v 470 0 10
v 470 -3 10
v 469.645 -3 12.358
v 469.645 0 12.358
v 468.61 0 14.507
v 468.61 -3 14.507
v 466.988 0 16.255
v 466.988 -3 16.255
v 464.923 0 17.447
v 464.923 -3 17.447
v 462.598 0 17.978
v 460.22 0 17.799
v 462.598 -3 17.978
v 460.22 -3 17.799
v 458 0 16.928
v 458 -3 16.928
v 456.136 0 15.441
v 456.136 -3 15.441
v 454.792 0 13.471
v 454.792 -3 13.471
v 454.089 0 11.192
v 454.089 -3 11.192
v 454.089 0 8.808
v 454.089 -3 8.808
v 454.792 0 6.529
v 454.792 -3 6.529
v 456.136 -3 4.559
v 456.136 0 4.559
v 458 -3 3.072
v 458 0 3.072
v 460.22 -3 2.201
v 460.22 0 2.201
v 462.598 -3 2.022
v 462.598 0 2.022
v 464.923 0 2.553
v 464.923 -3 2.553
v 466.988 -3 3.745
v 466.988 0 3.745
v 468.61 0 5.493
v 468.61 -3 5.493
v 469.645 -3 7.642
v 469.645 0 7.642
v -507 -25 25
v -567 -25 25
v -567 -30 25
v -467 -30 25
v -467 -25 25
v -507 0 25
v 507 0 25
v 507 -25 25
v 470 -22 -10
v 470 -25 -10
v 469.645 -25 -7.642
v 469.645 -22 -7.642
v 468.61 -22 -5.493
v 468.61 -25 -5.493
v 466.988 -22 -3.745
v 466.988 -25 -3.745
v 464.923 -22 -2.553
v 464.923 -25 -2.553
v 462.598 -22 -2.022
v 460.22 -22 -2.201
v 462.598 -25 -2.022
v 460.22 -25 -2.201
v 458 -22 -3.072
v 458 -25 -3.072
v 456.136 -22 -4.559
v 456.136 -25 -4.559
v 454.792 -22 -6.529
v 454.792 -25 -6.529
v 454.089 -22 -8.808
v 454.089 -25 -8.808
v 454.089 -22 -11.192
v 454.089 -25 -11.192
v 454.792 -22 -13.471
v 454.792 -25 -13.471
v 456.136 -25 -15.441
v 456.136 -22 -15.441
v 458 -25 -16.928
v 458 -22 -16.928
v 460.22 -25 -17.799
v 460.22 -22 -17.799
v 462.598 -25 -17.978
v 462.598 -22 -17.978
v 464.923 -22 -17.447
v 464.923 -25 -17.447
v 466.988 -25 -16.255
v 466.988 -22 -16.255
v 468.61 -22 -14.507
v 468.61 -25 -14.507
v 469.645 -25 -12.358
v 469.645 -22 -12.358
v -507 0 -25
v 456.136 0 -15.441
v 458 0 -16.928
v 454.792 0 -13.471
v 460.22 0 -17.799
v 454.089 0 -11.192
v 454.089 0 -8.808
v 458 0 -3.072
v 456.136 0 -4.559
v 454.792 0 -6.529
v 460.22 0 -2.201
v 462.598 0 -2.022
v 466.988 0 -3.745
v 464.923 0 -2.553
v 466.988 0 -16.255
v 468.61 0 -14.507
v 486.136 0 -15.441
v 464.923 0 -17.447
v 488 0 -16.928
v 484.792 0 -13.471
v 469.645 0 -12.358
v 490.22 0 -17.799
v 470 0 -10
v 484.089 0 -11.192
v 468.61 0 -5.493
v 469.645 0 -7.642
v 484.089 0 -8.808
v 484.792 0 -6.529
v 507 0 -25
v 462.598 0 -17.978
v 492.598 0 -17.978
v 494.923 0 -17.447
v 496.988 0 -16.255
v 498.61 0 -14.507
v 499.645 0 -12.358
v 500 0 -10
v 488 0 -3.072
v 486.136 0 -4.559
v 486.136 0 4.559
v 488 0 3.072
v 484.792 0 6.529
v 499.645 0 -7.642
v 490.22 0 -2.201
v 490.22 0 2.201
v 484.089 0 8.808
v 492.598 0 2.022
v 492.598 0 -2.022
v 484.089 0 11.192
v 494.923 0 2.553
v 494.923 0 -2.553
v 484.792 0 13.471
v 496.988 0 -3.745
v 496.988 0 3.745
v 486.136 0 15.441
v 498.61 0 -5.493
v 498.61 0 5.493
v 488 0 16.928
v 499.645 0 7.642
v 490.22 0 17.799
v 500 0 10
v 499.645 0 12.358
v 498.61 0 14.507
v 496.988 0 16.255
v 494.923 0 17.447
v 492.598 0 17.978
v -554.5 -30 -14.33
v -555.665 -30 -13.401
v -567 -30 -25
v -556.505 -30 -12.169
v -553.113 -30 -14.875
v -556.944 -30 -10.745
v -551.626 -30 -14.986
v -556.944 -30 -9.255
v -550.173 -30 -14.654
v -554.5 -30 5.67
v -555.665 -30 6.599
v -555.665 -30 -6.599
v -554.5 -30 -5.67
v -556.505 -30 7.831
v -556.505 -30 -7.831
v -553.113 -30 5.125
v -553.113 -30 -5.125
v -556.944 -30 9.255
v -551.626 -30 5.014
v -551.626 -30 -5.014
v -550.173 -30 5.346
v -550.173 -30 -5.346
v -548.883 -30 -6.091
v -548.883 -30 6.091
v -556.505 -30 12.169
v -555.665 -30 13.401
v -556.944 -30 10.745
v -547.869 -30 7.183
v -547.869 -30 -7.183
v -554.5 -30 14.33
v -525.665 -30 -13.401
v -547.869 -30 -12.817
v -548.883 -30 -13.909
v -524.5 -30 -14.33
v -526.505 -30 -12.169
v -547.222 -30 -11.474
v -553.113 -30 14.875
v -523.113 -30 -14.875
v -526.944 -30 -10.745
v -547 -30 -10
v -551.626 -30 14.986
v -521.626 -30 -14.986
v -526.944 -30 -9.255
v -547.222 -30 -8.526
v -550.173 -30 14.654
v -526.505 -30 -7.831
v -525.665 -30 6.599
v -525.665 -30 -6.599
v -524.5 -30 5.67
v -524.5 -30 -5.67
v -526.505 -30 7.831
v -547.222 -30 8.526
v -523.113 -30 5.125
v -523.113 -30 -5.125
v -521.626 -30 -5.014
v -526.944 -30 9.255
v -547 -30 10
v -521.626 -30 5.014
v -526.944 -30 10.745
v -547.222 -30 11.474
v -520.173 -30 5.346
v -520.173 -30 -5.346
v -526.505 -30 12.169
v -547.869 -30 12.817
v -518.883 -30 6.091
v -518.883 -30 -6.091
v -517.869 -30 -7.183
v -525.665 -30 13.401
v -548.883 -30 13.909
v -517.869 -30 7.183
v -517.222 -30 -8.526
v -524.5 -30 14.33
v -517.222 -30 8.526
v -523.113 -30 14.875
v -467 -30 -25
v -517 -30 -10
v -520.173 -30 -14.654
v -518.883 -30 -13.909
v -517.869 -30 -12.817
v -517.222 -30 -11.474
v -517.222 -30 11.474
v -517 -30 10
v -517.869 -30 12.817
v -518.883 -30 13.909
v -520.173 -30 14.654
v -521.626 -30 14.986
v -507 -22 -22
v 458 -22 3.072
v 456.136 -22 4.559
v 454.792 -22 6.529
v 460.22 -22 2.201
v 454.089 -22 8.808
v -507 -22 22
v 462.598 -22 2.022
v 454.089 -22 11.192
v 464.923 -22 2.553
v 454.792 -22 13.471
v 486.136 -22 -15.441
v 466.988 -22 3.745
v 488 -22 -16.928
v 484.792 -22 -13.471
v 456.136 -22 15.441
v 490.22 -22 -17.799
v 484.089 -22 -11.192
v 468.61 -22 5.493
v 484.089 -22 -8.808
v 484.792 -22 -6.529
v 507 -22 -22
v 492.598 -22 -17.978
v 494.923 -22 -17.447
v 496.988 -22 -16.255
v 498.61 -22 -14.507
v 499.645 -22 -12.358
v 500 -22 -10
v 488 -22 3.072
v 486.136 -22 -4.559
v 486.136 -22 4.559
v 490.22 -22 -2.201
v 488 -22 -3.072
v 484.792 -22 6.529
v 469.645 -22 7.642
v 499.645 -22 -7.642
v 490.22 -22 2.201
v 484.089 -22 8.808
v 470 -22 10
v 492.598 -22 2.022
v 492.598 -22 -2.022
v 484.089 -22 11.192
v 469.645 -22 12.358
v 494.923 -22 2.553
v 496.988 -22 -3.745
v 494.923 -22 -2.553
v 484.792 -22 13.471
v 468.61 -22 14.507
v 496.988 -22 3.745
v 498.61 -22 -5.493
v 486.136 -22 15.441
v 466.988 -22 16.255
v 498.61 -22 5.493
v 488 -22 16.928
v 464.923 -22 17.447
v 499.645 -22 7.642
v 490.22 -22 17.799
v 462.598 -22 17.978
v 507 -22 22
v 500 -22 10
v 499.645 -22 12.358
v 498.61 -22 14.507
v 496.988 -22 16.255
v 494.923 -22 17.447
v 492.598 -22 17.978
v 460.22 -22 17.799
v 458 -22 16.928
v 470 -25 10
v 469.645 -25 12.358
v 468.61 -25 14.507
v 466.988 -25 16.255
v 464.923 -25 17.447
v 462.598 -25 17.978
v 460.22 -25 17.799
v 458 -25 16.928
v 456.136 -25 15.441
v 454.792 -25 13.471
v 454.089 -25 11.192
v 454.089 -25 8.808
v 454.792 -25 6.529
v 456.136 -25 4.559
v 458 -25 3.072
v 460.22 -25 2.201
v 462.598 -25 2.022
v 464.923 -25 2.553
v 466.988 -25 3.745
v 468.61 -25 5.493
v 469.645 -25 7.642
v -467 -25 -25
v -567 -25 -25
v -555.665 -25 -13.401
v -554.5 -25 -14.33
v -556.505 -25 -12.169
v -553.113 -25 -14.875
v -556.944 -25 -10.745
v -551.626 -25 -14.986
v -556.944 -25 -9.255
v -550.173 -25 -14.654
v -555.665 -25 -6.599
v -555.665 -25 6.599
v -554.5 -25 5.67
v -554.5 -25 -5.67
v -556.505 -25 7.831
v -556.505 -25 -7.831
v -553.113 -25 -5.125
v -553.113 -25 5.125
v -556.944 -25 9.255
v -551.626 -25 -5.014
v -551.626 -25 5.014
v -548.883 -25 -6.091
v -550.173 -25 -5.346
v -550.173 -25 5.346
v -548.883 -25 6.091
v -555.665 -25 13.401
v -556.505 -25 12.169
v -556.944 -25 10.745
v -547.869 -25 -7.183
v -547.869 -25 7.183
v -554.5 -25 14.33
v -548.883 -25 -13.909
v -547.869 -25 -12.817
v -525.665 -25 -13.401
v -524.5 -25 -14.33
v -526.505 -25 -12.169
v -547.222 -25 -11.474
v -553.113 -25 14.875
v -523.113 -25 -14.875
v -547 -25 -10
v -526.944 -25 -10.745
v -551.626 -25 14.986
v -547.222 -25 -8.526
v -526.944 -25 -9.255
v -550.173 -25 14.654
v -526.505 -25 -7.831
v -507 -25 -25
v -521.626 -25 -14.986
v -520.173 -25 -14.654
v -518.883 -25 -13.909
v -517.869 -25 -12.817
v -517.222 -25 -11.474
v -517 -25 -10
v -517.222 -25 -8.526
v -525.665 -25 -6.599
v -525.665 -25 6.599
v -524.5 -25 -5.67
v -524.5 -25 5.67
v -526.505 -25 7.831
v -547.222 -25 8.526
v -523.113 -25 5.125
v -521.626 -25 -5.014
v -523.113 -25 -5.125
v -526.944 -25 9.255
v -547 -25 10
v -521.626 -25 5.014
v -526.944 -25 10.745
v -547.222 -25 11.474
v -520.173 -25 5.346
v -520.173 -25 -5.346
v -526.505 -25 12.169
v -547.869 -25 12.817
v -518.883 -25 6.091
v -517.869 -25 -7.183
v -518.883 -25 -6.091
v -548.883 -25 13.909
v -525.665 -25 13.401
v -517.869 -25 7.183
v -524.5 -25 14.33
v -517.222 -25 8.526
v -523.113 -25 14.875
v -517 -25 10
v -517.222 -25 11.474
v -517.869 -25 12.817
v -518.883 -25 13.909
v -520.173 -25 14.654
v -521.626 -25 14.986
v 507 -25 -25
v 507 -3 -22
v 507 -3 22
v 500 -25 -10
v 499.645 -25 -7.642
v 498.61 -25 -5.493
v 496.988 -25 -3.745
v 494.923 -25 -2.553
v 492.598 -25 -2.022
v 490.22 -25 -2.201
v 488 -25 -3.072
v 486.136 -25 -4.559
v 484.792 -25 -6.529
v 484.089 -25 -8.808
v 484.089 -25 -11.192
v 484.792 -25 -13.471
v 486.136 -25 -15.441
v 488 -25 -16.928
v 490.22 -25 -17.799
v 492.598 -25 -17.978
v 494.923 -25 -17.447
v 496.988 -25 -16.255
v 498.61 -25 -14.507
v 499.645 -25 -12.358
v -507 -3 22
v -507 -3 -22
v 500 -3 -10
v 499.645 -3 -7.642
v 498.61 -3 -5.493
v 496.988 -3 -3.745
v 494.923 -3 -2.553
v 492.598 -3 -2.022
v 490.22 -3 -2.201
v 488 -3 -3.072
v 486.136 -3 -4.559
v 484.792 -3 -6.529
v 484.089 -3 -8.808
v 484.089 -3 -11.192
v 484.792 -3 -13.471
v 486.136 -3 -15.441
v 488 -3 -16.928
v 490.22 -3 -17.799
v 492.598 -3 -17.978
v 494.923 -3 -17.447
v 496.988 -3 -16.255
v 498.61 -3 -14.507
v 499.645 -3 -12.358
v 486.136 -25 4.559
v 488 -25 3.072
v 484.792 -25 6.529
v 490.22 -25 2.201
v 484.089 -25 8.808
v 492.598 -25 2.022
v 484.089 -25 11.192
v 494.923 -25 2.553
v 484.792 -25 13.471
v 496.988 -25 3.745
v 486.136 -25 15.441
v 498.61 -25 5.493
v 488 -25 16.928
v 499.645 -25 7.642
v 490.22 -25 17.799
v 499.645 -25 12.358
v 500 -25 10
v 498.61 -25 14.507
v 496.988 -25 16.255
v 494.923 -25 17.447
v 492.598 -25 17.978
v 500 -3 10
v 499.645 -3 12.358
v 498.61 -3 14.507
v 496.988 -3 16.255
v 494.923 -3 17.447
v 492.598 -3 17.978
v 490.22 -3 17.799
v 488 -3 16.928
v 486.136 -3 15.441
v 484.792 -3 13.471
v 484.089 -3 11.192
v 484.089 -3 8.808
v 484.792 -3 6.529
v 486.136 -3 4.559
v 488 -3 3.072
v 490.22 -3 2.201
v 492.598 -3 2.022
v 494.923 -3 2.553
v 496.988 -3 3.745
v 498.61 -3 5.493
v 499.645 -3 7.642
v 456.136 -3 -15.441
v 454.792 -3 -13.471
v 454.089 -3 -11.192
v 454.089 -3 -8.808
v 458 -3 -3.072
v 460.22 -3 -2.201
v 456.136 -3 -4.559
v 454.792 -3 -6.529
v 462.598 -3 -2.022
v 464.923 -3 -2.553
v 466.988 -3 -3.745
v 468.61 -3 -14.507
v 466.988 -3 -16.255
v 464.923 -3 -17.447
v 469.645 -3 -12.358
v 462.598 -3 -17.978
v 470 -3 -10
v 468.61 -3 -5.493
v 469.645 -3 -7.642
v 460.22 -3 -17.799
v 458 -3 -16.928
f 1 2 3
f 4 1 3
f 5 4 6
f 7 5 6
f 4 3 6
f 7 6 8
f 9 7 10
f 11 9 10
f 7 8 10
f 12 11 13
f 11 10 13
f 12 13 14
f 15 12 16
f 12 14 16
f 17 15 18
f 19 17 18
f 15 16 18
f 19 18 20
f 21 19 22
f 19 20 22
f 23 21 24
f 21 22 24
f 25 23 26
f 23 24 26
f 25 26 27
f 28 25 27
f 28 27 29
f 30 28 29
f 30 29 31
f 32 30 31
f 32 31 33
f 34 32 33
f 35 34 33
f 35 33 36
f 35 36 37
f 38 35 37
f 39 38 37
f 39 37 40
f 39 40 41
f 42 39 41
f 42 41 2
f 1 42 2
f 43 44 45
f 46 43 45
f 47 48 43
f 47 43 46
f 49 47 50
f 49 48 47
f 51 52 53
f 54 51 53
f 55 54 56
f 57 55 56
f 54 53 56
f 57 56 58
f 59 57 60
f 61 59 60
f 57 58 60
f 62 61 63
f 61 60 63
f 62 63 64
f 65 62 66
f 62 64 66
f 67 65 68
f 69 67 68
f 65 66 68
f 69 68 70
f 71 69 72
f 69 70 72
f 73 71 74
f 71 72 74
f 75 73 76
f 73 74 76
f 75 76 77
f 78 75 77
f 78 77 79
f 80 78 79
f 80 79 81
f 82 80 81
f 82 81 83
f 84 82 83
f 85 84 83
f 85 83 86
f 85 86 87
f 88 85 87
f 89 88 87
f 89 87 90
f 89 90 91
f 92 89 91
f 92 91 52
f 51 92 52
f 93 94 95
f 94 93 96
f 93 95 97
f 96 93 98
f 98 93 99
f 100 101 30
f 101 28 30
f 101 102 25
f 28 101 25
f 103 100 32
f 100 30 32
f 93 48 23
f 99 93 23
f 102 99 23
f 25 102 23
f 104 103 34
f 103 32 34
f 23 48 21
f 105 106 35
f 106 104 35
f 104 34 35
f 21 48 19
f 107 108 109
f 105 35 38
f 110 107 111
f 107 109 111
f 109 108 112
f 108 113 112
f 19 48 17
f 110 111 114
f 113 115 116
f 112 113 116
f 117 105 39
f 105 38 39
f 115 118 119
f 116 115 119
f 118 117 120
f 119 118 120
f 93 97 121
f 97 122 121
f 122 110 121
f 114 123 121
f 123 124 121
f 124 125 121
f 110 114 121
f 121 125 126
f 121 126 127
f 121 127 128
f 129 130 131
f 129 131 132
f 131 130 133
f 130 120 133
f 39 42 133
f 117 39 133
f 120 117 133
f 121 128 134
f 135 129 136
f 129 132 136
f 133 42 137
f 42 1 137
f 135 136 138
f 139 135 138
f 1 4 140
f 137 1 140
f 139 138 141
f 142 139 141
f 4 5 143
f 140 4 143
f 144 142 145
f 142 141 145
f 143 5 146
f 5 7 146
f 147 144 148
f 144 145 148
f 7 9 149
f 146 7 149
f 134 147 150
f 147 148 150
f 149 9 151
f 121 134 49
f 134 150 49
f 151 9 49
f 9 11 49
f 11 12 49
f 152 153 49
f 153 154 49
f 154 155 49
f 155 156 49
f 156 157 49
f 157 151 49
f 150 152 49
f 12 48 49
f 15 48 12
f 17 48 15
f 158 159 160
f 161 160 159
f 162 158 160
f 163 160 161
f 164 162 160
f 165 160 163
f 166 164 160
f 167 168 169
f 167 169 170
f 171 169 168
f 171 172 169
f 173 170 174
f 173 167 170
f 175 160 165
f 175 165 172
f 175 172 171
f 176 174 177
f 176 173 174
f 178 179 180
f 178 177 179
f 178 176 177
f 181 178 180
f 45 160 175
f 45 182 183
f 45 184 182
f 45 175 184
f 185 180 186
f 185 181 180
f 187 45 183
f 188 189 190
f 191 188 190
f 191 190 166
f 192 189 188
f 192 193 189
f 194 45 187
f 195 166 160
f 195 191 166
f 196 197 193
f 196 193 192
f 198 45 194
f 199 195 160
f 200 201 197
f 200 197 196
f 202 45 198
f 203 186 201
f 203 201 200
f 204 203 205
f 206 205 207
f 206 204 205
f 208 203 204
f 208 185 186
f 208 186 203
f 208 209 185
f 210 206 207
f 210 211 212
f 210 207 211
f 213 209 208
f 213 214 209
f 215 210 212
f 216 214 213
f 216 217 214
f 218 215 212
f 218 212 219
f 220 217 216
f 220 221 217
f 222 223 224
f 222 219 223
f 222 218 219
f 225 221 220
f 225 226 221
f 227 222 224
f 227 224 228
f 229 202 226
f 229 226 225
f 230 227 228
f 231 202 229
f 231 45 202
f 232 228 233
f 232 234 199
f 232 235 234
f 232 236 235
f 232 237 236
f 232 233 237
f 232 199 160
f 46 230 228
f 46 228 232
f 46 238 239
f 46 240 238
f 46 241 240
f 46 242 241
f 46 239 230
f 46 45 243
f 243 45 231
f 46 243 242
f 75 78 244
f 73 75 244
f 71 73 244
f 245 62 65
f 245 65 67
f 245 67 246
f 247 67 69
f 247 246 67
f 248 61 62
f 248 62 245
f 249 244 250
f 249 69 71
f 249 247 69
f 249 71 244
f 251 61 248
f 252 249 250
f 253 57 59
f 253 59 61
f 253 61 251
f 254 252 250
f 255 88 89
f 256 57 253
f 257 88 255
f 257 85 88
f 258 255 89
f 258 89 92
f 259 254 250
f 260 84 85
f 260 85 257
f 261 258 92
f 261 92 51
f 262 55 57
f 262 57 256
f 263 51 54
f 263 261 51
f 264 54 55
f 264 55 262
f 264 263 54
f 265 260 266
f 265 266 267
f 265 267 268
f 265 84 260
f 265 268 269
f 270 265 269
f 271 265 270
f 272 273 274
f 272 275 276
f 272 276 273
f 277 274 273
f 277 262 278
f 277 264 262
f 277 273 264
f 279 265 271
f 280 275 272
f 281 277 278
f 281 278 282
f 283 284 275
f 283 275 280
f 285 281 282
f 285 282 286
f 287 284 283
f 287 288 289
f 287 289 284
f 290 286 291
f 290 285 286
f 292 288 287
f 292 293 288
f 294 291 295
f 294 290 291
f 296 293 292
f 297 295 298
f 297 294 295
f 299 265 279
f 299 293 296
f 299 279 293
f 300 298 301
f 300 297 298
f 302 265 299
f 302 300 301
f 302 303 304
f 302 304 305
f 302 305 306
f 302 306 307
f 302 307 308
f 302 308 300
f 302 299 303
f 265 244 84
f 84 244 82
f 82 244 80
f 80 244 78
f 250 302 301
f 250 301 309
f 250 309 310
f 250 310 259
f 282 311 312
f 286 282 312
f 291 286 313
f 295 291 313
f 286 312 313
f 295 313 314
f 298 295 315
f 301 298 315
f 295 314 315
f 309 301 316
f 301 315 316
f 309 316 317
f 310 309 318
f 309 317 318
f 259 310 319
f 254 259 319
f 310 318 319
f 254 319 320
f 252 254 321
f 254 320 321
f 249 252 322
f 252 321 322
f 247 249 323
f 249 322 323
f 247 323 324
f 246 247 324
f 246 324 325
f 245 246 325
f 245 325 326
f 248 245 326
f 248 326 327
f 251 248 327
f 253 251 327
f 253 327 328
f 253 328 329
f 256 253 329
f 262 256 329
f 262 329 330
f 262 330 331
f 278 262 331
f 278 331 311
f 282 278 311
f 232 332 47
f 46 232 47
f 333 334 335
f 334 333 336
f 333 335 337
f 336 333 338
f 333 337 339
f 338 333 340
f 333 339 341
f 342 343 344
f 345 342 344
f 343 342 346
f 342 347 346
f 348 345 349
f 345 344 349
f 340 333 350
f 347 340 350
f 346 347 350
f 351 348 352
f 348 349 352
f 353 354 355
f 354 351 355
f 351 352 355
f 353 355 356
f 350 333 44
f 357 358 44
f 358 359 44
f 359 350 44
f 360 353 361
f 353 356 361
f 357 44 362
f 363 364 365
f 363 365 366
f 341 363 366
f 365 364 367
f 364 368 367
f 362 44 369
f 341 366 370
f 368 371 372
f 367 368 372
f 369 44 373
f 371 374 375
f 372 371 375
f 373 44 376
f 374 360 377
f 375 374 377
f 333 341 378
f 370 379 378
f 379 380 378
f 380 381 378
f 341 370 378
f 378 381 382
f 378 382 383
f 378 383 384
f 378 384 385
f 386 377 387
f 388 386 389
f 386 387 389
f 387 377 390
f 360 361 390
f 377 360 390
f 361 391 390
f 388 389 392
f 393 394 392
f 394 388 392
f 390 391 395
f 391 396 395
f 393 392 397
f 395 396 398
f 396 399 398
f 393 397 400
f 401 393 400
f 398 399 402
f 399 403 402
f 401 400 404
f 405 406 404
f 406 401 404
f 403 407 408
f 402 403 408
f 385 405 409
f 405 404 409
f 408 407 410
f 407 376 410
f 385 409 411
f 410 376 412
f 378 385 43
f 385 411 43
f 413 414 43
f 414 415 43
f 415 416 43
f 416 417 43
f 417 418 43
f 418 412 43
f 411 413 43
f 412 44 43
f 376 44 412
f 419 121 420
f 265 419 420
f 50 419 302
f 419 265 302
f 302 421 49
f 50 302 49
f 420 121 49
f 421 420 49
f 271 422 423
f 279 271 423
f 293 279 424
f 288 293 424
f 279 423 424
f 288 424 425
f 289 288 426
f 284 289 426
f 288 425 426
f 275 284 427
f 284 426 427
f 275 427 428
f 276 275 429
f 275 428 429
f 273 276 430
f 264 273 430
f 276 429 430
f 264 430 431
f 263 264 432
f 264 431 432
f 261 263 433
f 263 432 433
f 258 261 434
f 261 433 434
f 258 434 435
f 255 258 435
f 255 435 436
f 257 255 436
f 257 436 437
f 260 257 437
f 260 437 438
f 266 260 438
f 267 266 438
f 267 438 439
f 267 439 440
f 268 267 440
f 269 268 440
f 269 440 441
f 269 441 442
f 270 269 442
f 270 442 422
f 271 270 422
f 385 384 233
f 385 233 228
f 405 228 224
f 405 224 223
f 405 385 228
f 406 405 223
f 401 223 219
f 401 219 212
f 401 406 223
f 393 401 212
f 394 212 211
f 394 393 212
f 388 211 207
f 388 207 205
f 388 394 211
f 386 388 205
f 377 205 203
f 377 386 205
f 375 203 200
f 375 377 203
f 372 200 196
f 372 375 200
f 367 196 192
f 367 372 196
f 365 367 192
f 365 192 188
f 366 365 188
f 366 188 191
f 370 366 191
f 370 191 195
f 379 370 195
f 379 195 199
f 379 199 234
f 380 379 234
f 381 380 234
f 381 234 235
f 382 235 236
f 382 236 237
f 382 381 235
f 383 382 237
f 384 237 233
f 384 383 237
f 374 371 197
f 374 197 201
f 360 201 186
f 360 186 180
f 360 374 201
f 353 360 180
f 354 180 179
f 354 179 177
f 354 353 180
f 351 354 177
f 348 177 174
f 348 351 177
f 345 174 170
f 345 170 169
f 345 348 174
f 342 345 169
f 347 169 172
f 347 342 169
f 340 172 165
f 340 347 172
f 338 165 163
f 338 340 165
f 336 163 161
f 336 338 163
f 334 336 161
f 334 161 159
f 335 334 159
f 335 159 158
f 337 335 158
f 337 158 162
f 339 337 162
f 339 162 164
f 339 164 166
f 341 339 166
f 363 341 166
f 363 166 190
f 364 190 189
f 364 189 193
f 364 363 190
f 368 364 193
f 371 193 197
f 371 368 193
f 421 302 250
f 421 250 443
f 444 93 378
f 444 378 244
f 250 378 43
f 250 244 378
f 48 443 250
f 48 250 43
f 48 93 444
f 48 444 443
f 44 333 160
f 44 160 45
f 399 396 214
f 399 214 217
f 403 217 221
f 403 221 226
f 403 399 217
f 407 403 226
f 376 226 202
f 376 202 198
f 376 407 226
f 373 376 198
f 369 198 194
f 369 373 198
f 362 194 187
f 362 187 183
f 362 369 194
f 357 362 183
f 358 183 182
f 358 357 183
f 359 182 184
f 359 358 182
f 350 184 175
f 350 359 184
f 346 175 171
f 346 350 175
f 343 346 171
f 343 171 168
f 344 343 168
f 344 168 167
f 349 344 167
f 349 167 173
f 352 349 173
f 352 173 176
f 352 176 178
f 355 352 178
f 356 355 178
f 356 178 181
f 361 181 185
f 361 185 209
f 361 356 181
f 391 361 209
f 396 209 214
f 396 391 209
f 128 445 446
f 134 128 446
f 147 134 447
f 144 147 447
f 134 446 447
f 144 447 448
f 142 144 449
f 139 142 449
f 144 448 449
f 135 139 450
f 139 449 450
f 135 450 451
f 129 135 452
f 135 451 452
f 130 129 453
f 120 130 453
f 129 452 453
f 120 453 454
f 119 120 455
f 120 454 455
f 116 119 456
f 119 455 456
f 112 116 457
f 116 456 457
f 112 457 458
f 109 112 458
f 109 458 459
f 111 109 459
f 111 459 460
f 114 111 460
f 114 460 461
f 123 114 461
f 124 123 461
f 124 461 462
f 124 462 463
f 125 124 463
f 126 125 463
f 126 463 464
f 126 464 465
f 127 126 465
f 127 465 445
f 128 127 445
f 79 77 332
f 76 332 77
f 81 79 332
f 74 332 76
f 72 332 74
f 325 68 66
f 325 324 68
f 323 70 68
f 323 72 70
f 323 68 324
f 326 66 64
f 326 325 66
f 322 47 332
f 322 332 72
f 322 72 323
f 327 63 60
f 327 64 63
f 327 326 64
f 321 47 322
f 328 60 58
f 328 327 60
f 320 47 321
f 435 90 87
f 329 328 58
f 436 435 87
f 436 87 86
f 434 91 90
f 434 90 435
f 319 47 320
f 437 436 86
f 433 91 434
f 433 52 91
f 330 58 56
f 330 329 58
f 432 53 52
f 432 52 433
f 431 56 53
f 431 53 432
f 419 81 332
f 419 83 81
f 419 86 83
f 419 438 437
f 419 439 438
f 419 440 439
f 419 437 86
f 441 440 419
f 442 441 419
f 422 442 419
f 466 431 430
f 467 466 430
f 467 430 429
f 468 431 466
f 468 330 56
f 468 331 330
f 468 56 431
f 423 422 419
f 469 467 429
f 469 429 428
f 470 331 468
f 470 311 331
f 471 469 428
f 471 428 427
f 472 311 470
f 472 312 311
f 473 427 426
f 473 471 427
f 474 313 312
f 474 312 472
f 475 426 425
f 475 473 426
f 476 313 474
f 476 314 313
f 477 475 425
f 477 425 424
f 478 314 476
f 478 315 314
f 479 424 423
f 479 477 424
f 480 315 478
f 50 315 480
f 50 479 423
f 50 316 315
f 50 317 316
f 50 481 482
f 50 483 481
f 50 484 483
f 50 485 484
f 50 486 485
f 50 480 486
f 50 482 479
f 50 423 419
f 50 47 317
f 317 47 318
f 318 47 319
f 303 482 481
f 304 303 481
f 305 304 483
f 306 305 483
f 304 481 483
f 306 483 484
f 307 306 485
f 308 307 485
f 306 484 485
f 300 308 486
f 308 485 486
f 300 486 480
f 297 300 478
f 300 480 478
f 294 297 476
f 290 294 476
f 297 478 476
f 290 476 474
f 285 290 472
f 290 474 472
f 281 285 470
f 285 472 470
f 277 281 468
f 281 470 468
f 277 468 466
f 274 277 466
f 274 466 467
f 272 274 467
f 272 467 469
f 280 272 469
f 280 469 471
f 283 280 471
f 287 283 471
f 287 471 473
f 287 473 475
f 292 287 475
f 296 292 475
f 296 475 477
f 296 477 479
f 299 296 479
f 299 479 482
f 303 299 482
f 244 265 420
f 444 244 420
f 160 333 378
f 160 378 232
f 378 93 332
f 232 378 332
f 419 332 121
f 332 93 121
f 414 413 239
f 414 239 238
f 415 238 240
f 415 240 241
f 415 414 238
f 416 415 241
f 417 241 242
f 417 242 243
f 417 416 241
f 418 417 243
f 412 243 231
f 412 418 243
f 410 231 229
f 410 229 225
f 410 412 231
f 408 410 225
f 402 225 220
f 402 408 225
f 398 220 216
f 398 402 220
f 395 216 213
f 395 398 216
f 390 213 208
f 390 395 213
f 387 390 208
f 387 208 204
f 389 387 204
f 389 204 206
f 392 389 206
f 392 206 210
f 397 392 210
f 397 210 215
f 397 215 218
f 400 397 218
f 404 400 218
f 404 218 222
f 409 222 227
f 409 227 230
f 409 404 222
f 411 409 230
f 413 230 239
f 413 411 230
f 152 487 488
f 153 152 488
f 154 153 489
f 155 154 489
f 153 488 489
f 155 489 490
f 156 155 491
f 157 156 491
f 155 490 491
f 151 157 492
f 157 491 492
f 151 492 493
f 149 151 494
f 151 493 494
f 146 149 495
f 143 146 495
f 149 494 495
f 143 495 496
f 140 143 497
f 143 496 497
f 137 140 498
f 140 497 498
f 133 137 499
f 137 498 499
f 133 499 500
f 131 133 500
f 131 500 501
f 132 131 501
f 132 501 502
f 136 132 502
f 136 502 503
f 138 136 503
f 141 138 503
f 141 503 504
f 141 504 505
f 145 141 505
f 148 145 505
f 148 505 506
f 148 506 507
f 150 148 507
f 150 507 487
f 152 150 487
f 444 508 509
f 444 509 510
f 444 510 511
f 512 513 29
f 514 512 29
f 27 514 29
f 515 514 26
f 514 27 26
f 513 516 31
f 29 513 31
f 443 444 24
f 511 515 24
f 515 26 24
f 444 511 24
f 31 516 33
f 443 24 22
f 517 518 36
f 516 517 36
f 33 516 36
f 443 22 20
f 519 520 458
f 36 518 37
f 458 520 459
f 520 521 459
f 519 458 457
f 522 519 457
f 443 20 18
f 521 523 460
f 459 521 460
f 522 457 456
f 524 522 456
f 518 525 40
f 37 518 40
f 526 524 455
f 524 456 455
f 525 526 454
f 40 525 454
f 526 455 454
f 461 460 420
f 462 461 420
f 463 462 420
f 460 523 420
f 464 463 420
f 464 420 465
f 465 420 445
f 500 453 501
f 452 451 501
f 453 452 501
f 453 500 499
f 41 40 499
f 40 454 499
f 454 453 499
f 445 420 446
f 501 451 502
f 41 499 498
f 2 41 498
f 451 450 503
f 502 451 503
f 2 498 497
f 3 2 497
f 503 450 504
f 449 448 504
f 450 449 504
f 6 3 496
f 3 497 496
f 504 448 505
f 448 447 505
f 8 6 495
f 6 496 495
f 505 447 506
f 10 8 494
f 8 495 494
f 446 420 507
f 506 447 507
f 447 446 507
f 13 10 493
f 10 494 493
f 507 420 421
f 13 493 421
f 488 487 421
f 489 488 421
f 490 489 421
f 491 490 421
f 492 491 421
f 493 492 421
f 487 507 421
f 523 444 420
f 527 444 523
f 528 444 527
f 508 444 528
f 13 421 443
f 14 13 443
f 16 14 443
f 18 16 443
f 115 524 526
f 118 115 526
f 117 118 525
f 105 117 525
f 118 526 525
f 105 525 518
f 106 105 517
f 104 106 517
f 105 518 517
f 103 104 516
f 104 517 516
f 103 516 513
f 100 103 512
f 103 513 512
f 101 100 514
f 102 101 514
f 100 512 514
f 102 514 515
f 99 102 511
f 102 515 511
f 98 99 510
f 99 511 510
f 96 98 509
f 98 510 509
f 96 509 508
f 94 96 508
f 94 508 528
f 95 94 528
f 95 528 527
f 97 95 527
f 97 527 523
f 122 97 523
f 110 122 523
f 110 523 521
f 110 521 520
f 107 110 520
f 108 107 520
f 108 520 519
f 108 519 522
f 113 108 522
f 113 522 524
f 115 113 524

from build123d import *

# Parameters (mm, degrees)
F0_W     = 1014
F0_H     = 50
F1_DEPTH = 25
F2_R     = 8
F3_DEPTH = 25
F4_W     = 19
F4_H     = 44
F5_DEPTH = 1014
F6_W     = 100
F6_H     = 50
F6_R     = 5
F7_DEPTH = 5


with BuildPart() as f1:
    # F0 (on Front) → F1 (new body)
    with BuildSketch(Plane.XZ):
        Rectangle(F0_W, F0_H)
    extrude(amount=F1_DEPTH)

    # F2 (on face) → F3 (cut)
    with BuildSketch(Plane.XZ.offset(25)):
        with Locations((462, 10)):
            Circle(F2_R)
        with Locations((462, -10)):
            Circle(F2_R)
        with Locations((492, 10)):
            Circle(F2_R)
        with Locations((492, -10)):
            Circle(F2_R)
    extrude(amount=-F3_DEPTH, mode=Mode.SUBTRACT)

    # F4 (on face) → F5 (cut)
    with BuildSketch(Plane.YZ.offset(507)):
        with Locations((-12.5, 0)):
            Rectangle(F4_W, F4_H)
    extrude(amount=-F5_DEPTH, mode=Mode.SUBTRACT)

    # F6 (on face) → F7 (join)
    with BuildSketch(Plane.XZ.offset(25)):
        with Locations((-517, 0)):
            Rectangle(F6_W, F6_H)
        with Locations((-552, -10)):
            Circle(F6_R, mode=Mode.SUBTRACT)
        with Locations((-522, -10)):
            Circle(F6_R, mode=Mode.SUBTRACT)
        with Locations((-552, 10)):
            Circle(F6_R, mode=Mode.SUBTRACT)
        with Locations((-522, 10)):
            Circle(F6_R, mode=Mode.SUBTRACT)
    extrude(amount=F7_DEPTH)


solid = f1.part
